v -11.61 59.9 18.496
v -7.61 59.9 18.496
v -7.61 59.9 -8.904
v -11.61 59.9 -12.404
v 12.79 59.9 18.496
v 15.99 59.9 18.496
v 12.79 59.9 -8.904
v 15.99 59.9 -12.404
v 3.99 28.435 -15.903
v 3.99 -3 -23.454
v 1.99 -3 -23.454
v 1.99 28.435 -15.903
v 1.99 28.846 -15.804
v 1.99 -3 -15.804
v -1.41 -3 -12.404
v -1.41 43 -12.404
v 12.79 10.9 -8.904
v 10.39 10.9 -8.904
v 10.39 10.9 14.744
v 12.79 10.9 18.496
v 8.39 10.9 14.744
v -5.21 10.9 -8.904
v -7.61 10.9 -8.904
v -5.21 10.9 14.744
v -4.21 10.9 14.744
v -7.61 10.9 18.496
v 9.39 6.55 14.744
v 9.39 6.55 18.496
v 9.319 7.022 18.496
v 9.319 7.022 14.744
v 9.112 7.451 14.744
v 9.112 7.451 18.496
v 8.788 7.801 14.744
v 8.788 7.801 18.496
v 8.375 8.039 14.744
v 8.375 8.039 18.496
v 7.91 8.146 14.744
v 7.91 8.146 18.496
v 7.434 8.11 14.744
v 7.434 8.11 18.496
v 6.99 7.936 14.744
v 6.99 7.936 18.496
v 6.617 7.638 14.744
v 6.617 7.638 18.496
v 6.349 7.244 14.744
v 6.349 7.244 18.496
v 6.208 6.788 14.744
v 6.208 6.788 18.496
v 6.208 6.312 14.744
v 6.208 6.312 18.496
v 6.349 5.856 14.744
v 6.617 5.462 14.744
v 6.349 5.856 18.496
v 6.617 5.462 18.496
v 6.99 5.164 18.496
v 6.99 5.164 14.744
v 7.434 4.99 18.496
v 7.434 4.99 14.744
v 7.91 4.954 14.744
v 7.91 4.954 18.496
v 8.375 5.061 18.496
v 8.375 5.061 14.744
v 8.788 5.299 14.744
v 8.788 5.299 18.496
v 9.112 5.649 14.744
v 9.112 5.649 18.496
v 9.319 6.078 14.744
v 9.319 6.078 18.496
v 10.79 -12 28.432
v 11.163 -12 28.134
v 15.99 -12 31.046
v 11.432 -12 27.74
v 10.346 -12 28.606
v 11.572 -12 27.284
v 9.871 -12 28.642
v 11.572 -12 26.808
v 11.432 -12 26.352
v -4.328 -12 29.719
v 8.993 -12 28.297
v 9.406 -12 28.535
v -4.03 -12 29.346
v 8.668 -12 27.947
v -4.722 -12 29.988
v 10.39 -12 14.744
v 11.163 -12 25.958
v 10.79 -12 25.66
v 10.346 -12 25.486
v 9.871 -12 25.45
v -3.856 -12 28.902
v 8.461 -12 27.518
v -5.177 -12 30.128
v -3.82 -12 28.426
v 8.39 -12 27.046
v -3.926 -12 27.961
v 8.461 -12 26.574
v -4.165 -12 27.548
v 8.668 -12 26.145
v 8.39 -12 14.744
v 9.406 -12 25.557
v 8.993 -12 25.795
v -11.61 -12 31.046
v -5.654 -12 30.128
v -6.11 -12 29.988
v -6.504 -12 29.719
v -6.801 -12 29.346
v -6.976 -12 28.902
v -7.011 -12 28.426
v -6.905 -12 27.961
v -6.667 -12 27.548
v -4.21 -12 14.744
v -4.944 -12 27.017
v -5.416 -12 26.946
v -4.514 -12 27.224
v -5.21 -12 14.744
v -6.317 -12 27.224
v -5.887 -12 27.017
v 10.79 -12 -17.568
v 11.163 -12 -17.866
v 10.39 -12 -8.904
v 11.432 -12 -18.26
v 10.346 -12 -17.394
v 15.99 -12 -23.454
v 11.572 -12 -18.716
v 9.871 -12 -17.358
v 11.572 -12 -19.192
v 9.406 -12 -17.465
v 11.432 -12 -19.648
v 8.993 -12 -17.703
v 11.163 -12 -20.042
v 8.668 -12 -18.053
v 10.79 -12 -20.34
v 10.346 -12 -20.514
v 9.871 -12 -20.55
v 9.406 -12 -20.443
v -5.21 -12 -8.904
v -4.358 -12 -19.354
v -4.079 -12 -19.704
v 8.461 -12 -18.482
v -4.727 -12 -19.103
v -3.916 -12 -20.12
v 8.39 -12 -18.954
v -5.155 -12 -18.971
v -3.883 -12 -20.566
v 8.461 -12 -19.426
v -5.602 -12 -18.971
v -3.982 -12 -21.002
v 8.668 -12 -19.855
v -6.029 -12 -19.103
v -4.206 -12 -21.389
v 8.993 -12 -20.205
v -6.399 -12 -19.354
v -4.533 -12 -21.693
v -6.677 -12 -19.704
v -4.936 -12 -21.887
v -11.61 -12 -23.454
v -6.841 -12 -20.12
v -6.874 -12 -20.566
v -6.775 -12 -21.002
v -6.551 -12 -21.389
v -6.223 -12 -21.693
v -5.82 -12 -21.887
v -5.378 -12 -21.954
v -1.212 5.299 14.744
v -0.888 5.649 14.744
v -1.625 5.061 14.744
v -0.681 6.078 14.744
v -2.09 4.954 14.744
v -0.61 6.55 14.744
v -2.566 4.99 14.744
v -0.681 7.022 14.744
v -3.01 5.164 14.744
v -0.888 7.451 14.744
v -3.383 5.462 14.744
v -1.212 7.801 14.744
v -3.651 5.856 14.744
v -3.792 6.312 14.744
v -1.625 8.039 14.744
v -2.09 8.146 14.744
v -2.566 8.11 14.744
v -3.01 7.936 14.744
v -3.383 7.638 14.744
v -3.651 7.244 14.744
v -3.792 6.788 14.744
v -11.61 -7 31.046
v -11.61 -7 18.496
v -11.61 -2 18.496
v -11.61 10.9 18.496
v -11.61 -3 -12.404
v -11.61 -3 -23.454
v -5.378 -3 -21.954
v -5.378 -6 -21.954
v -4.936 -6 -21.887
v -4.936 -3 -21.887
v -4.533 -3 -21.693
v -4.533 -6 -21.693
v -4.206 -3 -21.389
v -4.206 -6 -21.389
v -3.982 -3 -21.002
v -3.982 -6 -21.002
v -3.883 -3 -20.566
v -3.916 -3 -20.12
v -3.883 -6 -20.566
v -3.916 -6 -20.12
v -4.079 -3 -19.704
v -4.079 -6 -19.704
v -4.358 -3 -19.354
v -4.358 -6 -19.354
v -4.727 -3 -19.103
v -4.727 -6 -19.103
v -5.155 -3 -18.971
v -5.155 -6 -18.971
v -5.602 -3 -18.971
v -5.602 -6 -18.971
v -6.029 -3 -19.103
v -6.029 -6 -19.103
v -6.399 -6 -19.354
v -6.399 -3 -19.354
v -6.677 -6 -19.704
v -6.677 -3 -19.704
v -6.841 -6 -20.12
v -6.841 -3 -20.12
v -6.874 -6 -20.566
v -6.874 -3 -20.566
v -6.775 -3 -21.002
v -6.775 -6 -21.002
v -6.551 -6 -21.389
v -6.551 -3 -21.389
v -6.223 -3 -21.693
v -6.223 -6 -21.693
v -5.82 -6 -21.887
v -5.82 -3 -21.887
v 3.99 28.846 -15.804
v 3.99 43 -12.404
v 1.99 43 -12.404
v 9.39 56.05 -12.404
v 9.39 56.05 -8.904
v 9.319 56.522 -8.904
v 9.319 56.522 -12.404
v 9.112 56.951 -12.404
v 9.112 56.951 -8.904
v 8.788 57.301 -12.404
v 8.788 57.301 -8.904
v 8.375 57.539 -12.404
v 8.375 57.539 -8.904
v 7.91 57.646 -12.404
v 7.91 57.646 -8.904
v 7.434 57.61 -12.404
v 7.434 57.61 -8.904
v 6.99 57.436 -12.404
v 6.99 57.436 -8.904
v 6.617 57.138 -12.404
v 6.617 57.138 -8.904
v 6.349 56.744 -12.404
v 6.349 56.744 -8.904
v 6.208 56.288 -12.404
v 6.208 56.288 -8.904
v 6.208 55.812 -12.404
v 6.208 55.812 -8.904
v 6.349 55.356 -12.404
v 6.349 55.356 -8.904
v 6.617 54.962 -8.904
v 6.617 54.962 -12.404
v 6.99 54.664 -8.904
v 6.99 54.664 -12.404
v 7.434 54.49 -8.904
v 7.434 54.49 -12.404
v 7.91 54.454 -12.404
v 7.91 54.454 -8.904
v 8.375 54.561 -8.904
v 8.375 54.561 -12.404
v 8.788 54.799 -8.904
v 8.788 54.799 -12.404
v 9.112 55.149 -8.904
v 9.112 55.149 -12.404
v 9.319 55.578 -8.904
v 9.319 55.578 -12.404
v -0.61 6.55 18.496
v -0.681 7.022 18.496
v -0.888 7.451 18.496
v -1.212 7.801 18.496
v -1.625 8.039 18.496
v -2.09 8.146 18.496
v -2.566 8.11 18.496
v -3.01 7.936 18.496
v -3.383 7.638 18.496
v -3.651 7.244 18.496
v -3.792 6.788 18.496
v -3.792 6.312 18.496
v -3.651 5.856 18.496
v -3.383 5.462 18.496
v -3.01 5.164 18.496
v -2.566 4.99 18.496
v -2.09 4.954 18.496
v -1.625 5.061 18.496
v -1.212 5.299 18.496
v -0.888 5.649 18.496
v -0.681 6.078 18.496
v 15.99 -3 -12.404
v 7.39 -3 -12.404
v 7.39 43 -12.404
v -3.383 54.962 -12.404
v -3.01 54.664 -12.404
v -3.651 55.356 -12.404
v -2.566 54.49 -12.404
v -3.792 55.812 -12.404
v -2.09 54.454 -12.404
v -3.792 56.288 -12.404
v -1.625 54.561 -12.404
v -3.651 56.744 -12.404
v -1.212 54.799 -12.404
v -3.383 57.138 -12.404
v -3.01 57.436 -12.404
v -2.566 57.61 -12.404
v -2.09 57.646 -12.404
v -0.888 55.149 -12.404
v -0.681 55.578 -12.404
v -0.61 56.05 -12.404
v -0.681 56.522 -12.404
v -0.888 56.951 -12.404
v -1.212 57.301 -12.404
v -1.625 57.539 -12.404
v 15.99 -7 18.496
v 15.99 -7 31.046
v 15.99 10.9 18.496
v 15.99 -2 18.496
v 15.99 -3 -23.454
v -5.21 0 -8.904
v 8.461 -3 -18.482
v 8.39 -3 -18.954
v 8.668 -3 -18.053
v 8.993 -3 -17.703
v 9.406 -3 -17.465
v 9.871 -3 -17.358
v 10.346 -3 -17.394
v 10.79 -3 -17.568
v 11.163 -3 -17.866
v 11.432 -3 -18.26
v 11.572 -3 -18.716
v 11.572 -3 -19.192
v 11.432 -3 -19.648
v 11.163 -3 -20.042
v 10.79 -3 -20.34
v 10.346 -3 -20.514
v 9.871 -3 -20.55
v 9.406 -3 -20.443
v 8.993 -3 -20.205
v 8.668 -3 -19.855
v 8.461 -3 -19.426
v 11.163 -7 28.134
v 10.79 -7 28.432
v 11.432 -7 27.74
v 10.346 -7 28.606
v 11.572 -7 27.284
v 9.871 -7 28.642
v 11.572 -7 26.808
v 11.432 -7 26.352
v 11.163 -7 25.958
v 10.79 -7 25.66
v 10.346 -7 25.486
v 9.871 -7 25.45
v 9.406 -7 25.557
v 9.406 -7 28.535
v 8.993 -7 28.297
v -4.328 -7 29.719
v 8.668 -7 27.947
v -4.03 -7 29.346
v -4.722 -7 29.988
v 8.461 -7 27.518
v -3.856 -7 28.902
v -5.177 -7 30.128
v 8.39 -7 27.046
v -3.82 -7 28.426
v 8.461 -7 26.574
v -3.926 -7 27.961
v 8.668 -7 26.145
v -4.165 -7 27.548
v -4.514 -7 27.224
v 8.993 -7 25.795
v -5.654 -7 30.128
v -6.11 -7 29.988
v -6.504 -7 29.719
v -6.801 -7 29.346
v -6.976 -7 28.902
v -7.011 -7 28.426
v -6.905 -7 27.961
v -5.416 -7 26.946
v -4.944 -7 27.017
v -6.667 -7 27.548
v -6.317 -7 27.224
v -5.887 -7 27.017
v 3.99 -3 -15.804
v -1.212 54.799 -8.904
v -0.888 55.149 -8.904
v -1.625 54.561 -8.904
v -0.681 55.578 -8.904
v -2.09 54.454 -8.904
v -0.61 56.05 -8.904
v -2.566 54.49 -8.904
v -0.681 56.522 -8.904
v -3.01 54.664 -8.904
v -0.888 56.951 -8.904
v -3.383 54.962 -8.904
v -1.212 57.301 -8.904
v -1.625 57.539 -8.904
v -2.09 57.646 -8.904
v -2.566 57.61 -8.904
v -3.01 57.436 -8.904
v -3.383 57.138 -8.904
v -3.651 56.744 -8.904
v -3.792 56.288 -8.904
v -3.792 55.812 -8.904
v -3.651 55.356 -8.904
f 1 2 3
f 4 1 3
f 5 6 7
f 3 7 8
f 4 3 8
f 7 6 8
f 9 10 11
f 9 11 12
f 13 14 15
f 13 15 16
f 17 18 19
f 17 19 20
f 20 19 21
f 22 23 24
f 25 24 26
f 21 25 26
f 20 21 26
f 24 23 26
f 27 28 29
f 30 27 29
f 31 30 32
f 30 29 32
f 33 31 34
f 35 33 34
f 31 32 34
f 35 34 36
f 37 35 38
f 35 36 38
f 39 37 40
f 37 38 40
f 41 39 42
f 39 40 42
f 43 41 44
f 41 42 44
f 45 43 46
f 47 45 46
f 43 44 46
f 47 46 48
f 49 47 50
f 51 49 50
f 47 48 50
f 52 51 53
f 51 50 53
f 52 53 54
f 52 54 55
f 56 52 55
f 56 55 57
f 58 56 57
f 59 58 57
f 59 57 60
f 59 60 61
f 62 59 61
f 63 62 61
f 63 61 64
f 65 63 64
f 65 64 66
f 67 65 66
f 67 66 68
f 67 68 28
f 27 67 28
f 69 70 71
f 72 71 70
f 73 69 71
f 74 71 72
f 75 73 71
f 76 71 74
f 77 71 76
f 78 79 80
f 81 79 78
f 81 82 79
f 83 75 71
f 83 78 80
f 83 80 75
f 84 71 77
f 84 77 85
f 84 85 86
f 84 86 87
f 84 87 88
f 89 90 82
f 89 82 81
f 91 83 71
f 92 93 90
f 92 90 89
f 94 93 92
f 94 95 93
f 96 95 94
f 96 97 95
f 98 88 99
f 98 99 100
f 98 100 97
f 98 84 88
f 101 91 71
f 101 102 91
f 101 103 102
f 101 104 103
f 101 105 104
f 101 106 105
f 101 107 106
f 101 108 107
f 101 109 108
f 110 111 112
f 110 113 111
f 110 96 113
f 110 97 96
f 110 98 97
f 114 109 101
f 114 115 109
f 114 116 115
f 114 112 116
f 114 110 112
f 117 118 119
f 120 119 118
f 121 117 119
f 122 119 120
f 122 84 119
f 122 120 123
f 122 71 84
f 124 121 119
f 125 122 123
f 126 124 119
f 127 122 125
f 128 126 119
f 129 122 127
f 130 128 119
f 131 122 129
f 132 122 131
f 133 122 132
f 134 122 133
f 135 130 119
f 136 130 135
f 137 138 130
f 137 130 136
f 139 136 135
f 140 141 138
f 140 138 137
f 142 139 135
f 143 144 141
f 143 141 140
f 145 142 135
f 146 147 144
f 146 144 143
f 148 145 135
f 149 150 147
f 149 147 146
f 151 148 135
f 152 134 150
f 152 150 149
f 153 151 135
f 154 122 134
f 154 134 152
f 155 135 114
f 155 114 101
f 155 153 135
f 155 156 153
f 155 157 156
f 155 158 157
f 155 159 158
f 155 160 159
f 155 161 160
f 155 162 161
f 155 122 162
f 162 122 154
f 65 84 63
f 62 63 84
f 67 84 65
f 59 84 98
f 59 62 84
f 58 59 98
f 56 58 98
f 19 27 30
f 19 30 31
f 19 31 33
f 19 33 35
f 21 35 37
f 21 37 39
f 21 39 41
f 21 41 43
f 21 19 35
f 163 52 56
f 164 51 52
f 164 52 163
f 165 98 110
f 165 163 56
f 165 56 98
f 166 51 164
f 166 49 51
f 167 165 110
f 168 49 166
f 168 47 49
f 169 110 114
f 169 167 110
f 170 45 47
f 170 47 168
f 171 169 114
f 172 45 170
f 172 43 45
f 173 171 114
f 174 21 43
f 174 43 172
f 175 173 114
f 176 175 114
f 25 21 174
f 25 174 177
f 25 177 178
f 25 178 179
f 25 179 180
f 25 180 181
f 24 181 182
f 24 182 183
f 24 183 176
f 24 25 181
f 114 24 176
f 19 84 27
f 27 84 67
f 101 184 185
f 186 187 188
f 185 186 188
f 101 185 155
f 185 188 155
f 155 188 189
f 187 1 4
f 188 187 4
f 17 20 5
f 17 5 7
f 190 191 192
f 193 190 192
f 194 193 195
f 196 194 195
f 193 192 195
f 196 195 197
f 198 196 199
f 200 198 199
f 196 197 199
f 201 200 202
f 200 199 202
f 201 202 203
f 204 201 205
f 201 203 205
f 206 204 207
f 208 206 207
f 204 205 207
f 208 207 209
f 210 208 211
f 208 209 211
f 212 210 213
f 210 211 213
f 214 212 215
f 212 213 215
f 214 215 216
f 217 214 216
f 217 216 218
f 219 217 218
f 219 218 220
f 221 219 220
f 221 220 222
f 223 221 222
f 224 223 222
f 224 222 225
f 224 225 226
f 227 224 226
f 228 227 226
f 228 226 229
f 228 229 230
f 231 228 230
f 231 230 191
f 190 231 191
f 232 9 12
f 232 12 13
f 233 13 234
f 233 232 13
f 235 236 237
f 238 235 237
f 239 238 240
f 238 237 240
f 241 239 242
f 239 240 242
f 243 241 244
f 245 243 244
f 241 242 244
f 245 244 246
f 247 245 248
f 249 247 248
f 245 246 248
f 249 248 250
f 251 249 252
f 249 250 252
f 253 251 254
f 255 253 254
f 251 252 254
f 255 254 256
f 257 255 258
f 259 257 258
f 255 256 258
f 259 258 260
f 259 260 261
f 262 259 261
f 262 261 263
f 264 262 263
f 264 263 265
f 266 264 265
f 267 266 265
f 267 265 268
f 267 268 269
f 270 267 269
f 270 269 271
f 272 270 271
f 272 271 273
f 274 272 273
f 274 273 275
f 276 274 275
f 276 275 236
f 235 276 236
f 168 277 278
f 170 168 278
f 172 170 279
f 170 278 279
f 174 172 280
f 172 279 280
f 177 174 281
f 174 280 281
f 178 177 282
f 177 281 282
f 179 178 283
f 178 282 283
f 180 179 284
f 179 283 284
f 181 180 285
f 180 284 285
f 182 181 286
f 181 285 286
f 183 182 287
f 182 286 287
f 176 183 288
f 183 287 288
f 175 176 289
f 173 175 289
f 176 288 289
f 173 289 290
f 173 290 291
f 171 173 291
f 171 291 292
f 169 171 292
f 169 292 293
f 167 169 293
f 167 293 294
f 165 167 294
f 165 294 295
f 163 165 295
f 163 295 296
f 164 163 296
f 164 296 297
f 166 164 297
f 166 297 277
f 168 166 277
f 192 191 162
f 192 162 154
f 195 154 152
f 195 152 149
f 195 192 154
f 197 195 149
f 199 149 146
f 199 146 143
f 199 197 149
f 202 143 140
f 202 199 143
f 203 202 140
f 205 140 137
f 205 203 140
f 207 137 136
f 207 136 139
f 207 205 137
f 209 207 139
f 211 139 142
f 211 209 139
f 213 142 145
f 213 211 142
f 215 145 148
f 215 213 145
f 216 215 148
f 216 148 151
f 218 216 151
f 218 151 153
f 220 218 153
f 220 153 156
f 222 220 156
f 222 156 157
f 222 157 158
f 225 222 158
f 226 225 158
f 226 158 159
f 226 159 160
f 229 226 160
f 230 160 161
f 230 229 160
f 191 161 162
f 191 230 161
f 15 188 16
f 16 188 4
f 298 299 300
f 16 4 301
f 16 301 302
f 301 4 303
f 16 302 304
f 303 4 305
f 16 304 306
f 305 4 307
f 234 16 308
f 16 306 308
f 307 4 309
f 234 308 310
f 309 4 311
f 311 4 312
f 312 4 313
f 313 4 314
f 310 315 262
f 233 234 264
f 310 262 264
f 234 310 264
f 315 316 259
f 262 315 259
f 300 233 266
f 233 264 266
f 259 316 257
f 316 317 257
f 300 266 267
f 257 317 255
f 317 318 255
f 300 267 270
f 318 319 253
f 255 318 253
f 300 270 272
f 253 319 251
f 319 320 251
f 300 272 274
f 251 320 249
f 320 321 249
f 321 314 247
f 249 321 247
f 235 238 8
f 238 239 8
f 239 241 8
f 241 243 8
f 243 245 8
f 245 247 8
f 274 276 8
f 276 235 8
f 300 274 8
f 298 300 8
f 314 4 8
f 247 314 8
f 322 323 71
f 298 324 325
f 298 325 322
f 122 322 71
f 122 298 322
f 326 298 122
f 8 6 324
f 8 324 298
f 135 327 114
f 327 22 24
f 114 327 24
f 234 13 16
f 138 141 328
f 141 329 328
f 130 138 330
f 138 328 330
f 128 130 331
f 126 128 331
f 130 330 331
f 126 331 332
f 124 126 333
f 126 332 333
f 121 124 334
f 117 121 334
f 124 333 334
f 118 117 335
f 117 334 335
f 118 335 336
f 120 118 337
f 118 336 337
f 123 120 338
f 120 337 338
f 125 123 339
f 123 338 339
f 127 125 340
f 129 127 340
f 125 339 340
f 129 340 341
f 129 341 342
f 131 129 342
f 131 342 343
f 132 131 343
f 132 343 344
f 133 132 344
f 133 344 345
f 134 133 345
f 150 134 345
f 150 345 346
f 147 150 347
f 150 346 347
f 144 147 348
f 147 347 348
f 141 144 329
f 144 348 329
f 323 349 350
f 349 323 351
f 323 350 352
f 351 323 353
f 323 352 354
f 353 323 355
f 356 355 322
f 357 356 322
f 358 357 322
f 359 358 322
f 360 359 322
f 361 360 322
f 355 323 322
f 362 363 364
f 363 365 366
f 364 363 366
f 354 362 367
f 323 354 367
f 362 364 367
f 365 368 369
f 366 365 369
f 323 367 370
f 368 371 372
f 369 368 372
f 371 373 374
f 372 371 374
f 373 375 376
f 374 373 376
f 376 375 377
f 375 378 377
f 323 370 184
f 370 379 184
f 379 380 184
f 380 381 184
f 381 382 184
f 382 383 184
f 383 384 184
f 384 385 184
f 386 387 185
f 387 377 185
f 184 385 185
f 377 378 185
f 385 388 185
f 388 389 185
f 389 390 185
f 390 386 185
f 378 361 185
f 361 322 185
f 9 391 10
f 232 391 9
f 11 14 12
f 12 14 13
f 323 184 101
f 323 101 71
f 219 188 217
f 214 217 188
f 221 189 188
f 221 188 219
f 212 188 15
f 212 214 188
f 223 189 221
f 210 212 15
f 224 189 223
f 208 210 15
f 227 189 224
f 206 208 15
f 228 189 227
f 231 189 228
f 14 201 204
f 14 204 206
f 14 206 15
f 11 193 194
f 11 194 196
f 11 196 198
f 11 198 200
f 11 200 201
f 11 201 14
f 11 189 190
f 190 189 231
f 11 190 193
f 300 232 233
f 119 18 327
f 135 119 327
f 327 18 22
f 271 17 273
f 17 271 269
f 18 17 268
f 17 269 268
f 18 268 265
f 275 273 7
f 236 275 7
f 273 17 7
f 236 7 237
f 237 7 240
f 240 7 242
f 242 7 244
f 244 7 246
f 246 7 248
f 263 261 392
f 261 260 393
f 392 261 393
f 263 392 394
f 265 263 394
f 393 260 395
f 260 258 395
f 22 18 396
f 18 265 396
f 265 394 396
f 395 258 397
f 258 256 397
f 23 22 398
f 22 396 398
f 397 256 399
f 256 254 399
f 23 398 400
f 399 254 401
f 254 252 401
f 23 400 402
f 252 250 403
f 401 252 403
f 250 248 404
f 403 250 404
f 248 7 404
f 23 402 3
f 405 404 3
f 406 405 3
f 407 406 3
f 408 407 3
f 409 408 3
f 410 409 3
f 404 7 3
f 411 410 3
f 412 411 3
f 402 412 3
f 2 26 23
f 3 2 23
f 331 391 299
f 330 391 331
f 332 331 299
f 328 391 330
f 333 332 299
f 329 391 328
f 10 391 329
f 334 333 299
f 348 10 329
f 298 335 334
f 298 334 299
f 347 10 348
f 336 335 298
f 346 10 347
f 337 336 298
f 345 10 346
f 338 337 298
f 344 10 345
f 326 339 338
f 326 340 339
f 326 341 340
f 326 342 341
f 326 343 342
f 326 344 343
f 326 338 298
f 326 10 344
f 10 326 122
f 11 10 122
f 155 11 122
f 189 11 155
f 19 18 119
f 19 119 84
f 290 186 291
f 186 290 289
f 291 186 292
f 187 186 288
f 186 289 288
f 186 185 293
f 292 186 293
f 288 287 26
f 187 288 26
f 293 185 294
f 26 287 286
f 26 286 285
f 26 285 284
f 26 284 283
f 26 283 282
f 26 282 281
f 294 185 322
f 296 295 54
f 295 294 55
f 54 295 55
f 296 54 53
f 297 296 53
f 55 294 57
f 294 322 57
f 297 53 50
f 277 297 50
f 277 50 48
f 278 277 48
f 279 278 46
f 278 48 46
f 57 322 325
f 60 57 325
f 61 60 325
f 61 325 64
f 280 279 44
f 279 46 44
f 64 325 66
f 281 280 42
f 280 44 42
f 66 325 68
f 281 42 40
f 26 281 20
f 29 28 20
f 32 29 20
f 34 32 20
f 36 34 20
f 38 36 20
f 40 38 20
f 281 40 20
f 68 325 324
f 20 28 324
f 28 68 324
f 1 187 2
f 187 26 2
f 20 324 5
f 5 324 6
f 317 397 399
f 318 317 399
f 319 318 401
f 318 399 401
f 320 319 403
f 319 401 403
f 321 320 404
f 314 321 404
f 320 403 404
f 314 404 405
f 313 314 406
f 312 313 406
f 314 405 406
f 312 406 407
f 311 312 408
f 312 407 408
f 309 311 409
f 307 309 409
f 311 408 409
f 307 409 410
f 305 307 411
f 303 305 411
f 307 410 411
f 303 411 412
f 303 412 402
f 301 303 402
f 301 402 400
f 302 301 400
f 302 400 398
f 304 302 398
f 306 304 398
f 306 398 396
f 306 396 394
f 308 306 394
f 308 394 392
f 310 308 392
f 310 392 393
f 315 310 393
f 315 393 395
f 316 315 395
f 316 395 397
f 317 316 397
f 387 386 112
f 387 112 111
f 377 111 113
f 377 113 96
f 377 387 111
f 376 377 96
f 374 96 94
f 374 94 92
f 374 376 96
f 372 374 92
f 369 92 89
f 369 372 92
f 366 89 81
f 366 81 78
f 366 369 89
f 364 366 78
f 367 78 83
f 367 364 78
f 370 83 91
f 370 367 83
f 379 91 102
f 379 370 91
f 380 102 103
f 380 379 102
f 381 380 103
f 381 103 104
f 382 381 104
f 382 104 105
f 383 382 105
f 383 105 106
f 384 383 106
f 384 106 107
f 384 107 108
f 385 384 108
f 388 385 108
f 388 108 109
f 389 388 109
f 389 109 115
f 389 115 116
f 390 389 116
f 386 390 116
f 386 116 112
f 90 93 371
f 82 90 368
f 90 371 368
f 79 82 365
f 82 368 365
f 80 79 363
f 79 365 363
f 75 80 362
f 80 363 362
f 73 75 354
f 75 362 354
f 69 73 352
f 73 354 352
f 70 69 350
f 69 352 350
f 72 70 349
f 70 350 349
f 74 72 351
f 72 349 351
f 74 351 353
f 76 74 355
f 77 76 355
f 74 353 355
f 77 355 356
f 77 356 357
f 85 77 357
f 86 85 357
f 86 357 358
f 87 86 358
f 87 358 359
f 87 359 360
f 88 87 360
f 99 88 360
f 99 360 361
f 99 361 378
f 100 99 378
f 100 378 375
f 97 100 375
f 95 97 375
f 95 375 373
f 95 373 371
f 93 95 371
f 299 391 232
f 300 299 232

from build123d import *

# Parameters (mm, degrees)
SKETCH1_W               = 25
SKETCH1_H               = 17
BOSS_EXTRUDE1_DEPTH     = 12
MOVE_FACE1_BY           = 15
MOVE_FACE3_BY           = 8
SKETCH3_W               = 25
SKETCH3_H               = 12.751689795
BOSS_EXTRUDE2_DEPTH     = 6.9
SKETCH4_W               = 5
SKETCH4_H               = 16.698310205
BOSS_EXTRUDE3_DEPTH     = 6.9
MOVE_START              = -11.609792285
MOVE_FACE4_OUTLINE_W    = 6.9
MOVE_FACE4_OUTLINE_H    = 16.698310205
MOVE_FACE4_DEPTH        = 2.4
MOVE_FACE5_BY           = 20
SKETCH6_W               = 25
SKETCH6_H               = 10.9
BOSS_EXTRUDE5_DEPTH     = 2
MOVE_FACE6_BY           = 1.5
MOVE_FACE7_BY           = 2.6
SKETCH7_W               = 3.8
SKETCH7_H               = 30.95
BOSS_EXTRUDE6_DEPTH     = 41
SKETCH8_W               = 16.2
SKETCH8_H               = 3.5
BOSS_EXTRUDE7_DEPTH     = 41
SKETCH9_W               = 3
SKETCH9_H               = 30.95
BOSS_EXTRUDE8_DEPTH     = 41
SKETCH10_W              = 4.6
SKETCH10_H              = 3.5
BOSS_EXTRUDE9_DEPTH     = 41
MOVE_FACE8_BY           = 9
MOVE_FACE9_OUTLINE_W    = 6
MOVE_FACE9_OUTLINE_H    = 6.301689795
MOVE_FACE9_OUTLINE_H_2  = 3.5
MOVE_FACE9_DEPTH        = 27.6
MOVE_START_2            = 8.390207715
MOVE_FACE9_2_OUTLINE_W  = 6
MOVE_FACE9_2_OUTLINE_H  = 23.698310205
MOVE_FACE9_2_DEPTH      = 7.6
MOVE_FACE9_3_OUTLINE_W  = 6
MOVE_FACE9_3_OUTLINE_H  = 23.698310205
MOVE_FACE9_3_DEPTH      = 7.4
MOVE_FACE10_BY          = 10
SKETCH11_W              = 27.6
SKETCH11_H              = 3
BOSS_EXTRUDE10_DEPTH    = 11
SKETCH12_R              = 1.5
SKETCH12_R_2            = 1.6
CUT_EXTRUDE1_DEPTH      = 16
SKETCH13_R              = 1.6
CUT_EXTRUDE2_DEPTH      = 5
CUT_EXTRUDE3_START      = -9
SKETCH14_R              = 1.6
CUT_EXTRUDE3_DEPTH      = 9
SKETCH15_R              = 1.6
CUT_EXTRUDE4_DEPTH      = 5
MOVE_FACE14_BY          = 1
MOVE_FACE15_OUTLINE_W   = 16.9
MOVE_FACE15_OUTLINE_H   = 23.698310205
MOVE_FACE15_DEPTH       = 2
MOVE_FACE16_BY          = 8
MOVE_FACE17_BY          = 6
MOVE_FACE19_BY          = 6
MOVE_FACE20_BY          = 5
MOVE_FACE21_BY          = 0.2
MOVE_FACE22_BY          = 0.2
MOVE_START_3            = -12.454005935
MOVE_FACE23_OUTLINE_W   = 27.6
MOVE_FACE23_OUTLINE_H   = 62.9
MOVE_FACE23_DEPTH       = 0.05
MOVE_FACE24_BY          = 0.05
SKETCH17_R              = 1.6
CUT_EXTRUDE5_DEPTH      = 7.5
BOSS_EXTRUDE12_DEPTH    = 2
BOSS_EXTRUDE13_DEPTH    = 46
CUT_EXTRUDE6_DEPTH      = 70.24755409
CUT_EXTRUDE6_DEPTH_BACK = 70.24755409


# Read off the part's stored shape, not the designer's step: Move Face4, Move Face9, Move Face15, Move Face23
with BuildPart() as part:
    # Sketch1 → Boss-Extrude1 (new body)
    with BuildSketch(Plane(origin=(0, 0, 0), x_dir=(1, 0, 0), z_dir=(0, 1, 0))):
        with Locations((0.890207715, 2.454005935)):
            Rectangle(SKETCH1_W, SKETCH1_H)
    extrude(amount=BOSS_EXTRUDE1_DEPTH)

    # Move Face1: a face moved outward by 15.0
    extrude(part.faces().sort_by_distance((0.890207715, 6, 6.045994065))[0], amount=MOVE_FACE1_BY, dir=(0, 0, 1))

    # Move Face3: a face moved inward by 8.0
    extrude(part.faces().sort_by_distance((0.890207715, 12, 5.045994065))[0], amount=MOVE_FACE3_BY, dir=(0, -1, 0), mode=Mode.SUBTRACT)

    # Sketch3 → Boss-Extrude2 (add)
    with BuildSketch(Plane(origin=(0, 4, 0), x_dir=(1, 0, 0), z_dir=(0, 1, 0))):
        with Locations((0.890207715, -12.120149168)):
            Rectangle(SKETCH3_W, SKETCH3_H)
    extrude(amount=BOSS_EXTRUDE2_DEPTH)

    # Sketch4 → Boss-Extrude3 (add)
    with BuildSketch(Plane(origin=(0, 4, 0), x_dir=(1, 0, 0), z_dir=(0, 1, 0))):
        with Locations((10.890207715, 2.604850833)):
            Rectangle(SKETCH4_W, SKETCH4_H)
        with Locations((-6.709792285, 2.604850833)):
            Rectangle(SKETCH4_W, SKETCH4_H)
    extrude(amount=BOSS_EXTRUDE3_DEPTH)

    # Move Face4 outline → Move Face4 (add)
    with BuildSketch(Plane.YZ.offset(MOVE_START)):
        with Locations((7.45, -2.604850833)):
            Rectangle(MOVE_FACE4_OUTLINE_W, MOVE_FACE4_OUTLINE_H)
    extrude(amount=MOVE_FACE4_DEPTH)

    # Move Face5: a face moved inward by 20.0
    extrude(part.faces().sort_by_distance((2.090207715, 4, -2.604850832))[0], amount=MOVE_FACE5_BY, dir=(0, -1, 0), mode=Mode.SUBTRACT)

    # Sketch6 → Boss-Extrude5 (add)
    with BuildSketch(Plane(origin=(0, 0, -10.954005935), x_dir=(-1, 0, 0), z_dir=(0, 0, -1))):
        with Locations((-0.890207715, 5.45)):
            Rectangle(SKETCH6_W, SKETCH6_H)
    extrude(amount=-BOSS_EXTRUDE5_DEPTH)

    # Move Face6: a face moved outward by 1.5
    extrude(part.faces().sort_by_distance((0.890207715, 5.45, -10.954005935))[0], amount=MOVE_FACE6_BY, dir=(0, 0, -1))

    # Move Face7: a face moved outward by 2.6
    extrude(part.faces().sort_by_distance((13.390207715, 5.348749838, 3.512570938))[0], amount=MOVE_FACE7_BY, dir=(1, 0, 0))

    # Sketch7 → Boss-Extrude6 (add)
    with BuildSketch(Plane(origin=(0, 10.9, 0), x_dir=(1, 0, 0), z_dir=(0, 1, 0))):
        with Locations((-9.709792285, -3.020994065)):
            Rectangle(SKETCH7_W, SKETCH7_H)
    extrude(amount=BOSS_EXTRUDE6_DEPTH)

    # Sketch8 → Boss-Extrude7 (add)
    with BuildSketch(Plane(origin=(0, 10.9, 0), x_dir=(1, 0, 0), z_dir=(0, 1, 0))):
        with Locations((0.290207715, 10.704005935)):
            Rectangle(SKETCH8_W, SKETCH8_H)
    extrude(amount=BOSS_EXTRUDE7_DEPTH)

    # Sketch9 → Boss-Extrude8 (add)
    with BuildSketch(Plane(origin=(0, 10.9, 0), x_dir=(1, 0, 0), z_dir=(0, 1, 0))):
        with Locations((14.490207715, -3.020994065)):
            Rectangle(SKETCH9_W, SKETCH9_H)
    extrude(amount=BOSS_EXTRUDE8_DEPTH)

    # Sketch10 → Boss-Extrude9 (add)
    with BuildSketch(Plane(origin=(0, 10.9, 0), x_dir=(1, 0, 0), z_dir=(0, 1, 0))):
        with Locations((10.690207715, 10.704005935)):
            Rectangle(SKETCH10_W, SKETCH10_H)
    extrude(amount=BOSS_EXTRUDE9_DEPTH)

    # Move Face8: a face moved inward by 9.0
    extrude(part.faces().sort_by_distance((2.090207715, 5.45, 5.74430427))[0], amount=MOVE_FACE8_BY, dir=(0, 0, 1), mode=Mode.SUBTRACT)

    # Move Face9 outline → Move Face9 (add)
    with BuildSketch(Plane.YZ.offset(MOVE_START)):
        with Locations((-3, 17.895149168)):
            Rectangle(MOVE_FACE9_OUTLINE_W, MOVE_FACE9_OUTLINE_H)
        with Locations((-3, -10.704005935)):
            Rectangle(MOVE_FACE9_OUTLINE_W, MOVE_FACE9_OUTLINE_H_2)
    extrude(amount=MOVE_FACE9_DEPTH)

    # Move Face9 2 outline → Move Face9 2 (add)
    with BuildSketch(Plane.YZ.offset(MOVE_START_2)):
        with Locations((-3, 2.895149167)):
            Rectangle(MOVE_FACE9_2_OUTLINE_W, MOVE_FACE9_2_OUTLINE_H)
    extrude(amount=MOVE_FACE9_2_DEPTH)

    # Move Face9 3 outline → Move Face9 3 (add)
    with BuildSketch(Plane.YZ.offset(MOVE_START)):
        with Locations((-3, 2.895149167)):
            Rectangle(MOVE_FACE9_3_OUTLINE_W, MOVE_FACE9_3_OUTLINE_H)
    extrude(amount=MOVE_FACE9_3_DEPTH)

    # Move Face10: a face moved outward by 10.0
    extrude(part.faces().sort_by_distance((2.190207715, -1, 21.045994065))[0], amount=MOVE_FACE10_BY, dir=(0, 0, 1))

    # Sketch11 → Boss-Extrude10 (add)
    with BuildSketch(Plane(origin=(0, 0, -12.454005935), x_dir=(-1, 0, 0), z_dir=(0, 0, -1))):
        with Locations((-2.190207715, -4.5)):
            Rectangle(SKETCH11_W, SKETCH11_H)
    extrude(amount=BOSS_EXTRUDE10_DEPTH)

    # Sketch12 → Cut-Extrude1 (cut)
    with BuildSketch(Plane.XZ.offset(6)):
        with Locations(Location((-5.378312816, -20.454005935, 0), (0, 0, 270))):
            Circle(SKETCH12_R)
        with Locations(Location((-5.415791402, 28.545994065, 0), (0, 0, 270))):
            Circle(SKETCH12_R_2)
    extrude(amount=-CUT_EXTRUDE1_DEPTH, mode=Mode.SUBTRACT)

    # Sketch13 → Cut-Extrude2 (cut)
    with BuildSketch(Plane(origin=(0, -3, 0), x_dir=(1, 0, 0), z_dir=(0, 1, 0))):
        with Locations(Location((9.990207715, 18.954005935, 0), (0, 0, 180))):
            Circle(SKETCH13_R)
        with Locations(Location((9.990207715, -27.045994065, 0), (0, 0, 180))):
            Circle(SKETCH13_R)
    extrude(amount=-CUT_EXTRUDE2_DEPTH, mode=Mode.SUBTRACT)

    # Sketch14 → Cut-Extrude3 (cut)
    with BuildSketch(Plane.XZ.offset(3).offset(CUT_EXTRUDE3_START)):
        with Locations(Location((9.990207715, 27.045994065, 0), (0, 0, 90))):
            Circle(SKETCH14_R)
    extrude(amount=CUT_EXTRUDE3_DEPTH, mode=Mode.SUBTRACT)

    # Sketch15 → Cut-Extrude4 (cut)
    with BuildSketch(Plane.XY.offset(18.495994065)):
        with Locations((-2.209792285, 6.55)):
            Circle(SKETCH15_R)
        with Locations((7.790207715, 6.55)):
            Circle(SKETCH15_R)
    extrude(amount=-CUT_EXTRUDE4_DEPTH, mode=Mode.SUBTRACT)

    # Move Face14: a face moved inward by 1.0
    extrude(part.faces().sort_by_distance((-4.209792285, 2.45, 2.895149168))[0], amount=MOVE_FACE14_BY, dir=(-1, 0, 0), mode=Mode.SUBTRACT)

    # Move Face15 outline → Move Face15 (cut)
    with BuildSketch(Plane.YZ.offset(MOVE_START_2)):
        with Locations((2.45, 2.895149167)):
            Rectangle(MOVE_FACE15_OUTLINE_W, MOVE_FACE15_OUTLINE_H)
    extrude(amount=MOVE_FACE15_DEPTH, mode=Mode.SUBTRACT)

    # Move Face16: a face moved outward by 8.0
    extrude(part.faces().sort_by_distance((2.190207715, 51.9, -9.359005935))[0], amount=MOVE_FACE16_BY, dir=(0, 1, 0))

    # Move Face17: a face moved inward by 6.0
    extrude(part.faces().sort_by_distance((2.185483915, 4, 24.62368036))[0], amount=MOVE_FACE17_BY, dir=(0, -1, 0), mode=Mode.SUBTRACT)

    # Move Face19: a face moved outward by 6.0
    extrude(part.faces().sort_by_distance((13.230207715, -6, 3.795994065))[0], amount=MOVE_FACE19_BY, dir=(0, -1, 0))

    # Move Face20: a face moved inward by 5.0
    extrude(part.faces().sort_by_distance((2.185483915, -2, 24.62368036))[0], amount=MOVE_FACE20_BY, dir=(0, -1, 0), mode=Mode.SUBTRACT)

    # Move Face21: a face moved outward by 0.2
    extrude(part.faces().sort_by_distance((-7.809792285, 35.4, 4.770994065))[0], amount=MOVE_FACE21_BY, dir=(1, 0, 0))

    # Move Face22: a face moved outward by 0.2
    extrude(part.faces().sort_by_distance((12.990207715, 35.4, 4.770994065))[0], amount=MOVE_FACE22_BY, dir=(-1, 0, 0))

    # Move Face23 outline → Move Face23 (cut)
    with BuildSketch(Plane.XY.offset(MOVE_START_3)):
        with Locations((2.190207715, 28.45)):
            Rectangle(MOVE_FACE23_OUTLINE_W, MOVE_FACE23_OUTLINE_H)
    extrude(amount=MOVE_FACE23_DEPTH, mode=Mode.SUBTRACT)

    # Move Face24: a face moved outward by 0.05
    extrude(part.faces().sort_by_distance((2.590207715, 25.934788184, -8.954005935))[0], amount=MOVE_FACE24_BY, dir=(0, 0, 1))

    # Sketch17 → Cut-Extrude5 (cut)
    with BuildSketch(Plane.XY.offset(-8.904005935)):
        with Locations((-2.209792285, 56.05)):
            Circle(SKETCH17_R)
        with Locations((7.790207715, 56.05)):
            Circle(SKETCH17_R)
    extrude(amount=-CUT_EXTRUDE5_DEPTH, mode=Mode.SUBTRACT)

    # Sketch19 → Boss-Extrude12 (add)
    with BuildSketch(Plane(origin=(3.990207715, 0, 0), x_dir=(0, 0, -1), z_dir=(1, 0, 0))):
        Polygon((23.454005935, -3), (12.404005935, 43), (12.404005935, -3), align=None)
    extrude(amount=-BOSS_EXTRUDE12_DEPTH)

    # Sketch20 → Boss-Extrude13 (add)
    with BuildSketch(Plane(origin=(0, -3, 0), x_dir=(1, 0, 0), z_dir=(0, 1, 0))):
        Polygon((1.990207715, 15.804005935), (-1.409792285, 12.404005935), (1.990207715, 12.404005935), align=None)
        Polygon((3.990207715, 15.804005935), (7.390207715, 12.404005935), (3.990207715, 12.404005935), align=None)
    extrude(amount=BOSS_EXTRUDE13_DEPTH)

    # Sketch21 → Cut-Extrude6 (cut, two sides: drawn at the far end of the back side and taken through both)
    with BuildSketch(Plane(origin=(3.990207715, 0, 0), x_dir=(0, 0, -1), z_dir=(1, 0, 0)).offset(-CUT_EXTRUDE6_DEPTH_BACK)):
        Polygon((15.902869946, 28.434593255), (12.404005935, 43), (16.038201458, 43), align=None)
    extrude(amount=CUT_EXTRUDE6_DEPTH + CUT_EXTRUDE6_DEPTH_BACK, mode=Mode.SUBTRACT)


solid = part.part
